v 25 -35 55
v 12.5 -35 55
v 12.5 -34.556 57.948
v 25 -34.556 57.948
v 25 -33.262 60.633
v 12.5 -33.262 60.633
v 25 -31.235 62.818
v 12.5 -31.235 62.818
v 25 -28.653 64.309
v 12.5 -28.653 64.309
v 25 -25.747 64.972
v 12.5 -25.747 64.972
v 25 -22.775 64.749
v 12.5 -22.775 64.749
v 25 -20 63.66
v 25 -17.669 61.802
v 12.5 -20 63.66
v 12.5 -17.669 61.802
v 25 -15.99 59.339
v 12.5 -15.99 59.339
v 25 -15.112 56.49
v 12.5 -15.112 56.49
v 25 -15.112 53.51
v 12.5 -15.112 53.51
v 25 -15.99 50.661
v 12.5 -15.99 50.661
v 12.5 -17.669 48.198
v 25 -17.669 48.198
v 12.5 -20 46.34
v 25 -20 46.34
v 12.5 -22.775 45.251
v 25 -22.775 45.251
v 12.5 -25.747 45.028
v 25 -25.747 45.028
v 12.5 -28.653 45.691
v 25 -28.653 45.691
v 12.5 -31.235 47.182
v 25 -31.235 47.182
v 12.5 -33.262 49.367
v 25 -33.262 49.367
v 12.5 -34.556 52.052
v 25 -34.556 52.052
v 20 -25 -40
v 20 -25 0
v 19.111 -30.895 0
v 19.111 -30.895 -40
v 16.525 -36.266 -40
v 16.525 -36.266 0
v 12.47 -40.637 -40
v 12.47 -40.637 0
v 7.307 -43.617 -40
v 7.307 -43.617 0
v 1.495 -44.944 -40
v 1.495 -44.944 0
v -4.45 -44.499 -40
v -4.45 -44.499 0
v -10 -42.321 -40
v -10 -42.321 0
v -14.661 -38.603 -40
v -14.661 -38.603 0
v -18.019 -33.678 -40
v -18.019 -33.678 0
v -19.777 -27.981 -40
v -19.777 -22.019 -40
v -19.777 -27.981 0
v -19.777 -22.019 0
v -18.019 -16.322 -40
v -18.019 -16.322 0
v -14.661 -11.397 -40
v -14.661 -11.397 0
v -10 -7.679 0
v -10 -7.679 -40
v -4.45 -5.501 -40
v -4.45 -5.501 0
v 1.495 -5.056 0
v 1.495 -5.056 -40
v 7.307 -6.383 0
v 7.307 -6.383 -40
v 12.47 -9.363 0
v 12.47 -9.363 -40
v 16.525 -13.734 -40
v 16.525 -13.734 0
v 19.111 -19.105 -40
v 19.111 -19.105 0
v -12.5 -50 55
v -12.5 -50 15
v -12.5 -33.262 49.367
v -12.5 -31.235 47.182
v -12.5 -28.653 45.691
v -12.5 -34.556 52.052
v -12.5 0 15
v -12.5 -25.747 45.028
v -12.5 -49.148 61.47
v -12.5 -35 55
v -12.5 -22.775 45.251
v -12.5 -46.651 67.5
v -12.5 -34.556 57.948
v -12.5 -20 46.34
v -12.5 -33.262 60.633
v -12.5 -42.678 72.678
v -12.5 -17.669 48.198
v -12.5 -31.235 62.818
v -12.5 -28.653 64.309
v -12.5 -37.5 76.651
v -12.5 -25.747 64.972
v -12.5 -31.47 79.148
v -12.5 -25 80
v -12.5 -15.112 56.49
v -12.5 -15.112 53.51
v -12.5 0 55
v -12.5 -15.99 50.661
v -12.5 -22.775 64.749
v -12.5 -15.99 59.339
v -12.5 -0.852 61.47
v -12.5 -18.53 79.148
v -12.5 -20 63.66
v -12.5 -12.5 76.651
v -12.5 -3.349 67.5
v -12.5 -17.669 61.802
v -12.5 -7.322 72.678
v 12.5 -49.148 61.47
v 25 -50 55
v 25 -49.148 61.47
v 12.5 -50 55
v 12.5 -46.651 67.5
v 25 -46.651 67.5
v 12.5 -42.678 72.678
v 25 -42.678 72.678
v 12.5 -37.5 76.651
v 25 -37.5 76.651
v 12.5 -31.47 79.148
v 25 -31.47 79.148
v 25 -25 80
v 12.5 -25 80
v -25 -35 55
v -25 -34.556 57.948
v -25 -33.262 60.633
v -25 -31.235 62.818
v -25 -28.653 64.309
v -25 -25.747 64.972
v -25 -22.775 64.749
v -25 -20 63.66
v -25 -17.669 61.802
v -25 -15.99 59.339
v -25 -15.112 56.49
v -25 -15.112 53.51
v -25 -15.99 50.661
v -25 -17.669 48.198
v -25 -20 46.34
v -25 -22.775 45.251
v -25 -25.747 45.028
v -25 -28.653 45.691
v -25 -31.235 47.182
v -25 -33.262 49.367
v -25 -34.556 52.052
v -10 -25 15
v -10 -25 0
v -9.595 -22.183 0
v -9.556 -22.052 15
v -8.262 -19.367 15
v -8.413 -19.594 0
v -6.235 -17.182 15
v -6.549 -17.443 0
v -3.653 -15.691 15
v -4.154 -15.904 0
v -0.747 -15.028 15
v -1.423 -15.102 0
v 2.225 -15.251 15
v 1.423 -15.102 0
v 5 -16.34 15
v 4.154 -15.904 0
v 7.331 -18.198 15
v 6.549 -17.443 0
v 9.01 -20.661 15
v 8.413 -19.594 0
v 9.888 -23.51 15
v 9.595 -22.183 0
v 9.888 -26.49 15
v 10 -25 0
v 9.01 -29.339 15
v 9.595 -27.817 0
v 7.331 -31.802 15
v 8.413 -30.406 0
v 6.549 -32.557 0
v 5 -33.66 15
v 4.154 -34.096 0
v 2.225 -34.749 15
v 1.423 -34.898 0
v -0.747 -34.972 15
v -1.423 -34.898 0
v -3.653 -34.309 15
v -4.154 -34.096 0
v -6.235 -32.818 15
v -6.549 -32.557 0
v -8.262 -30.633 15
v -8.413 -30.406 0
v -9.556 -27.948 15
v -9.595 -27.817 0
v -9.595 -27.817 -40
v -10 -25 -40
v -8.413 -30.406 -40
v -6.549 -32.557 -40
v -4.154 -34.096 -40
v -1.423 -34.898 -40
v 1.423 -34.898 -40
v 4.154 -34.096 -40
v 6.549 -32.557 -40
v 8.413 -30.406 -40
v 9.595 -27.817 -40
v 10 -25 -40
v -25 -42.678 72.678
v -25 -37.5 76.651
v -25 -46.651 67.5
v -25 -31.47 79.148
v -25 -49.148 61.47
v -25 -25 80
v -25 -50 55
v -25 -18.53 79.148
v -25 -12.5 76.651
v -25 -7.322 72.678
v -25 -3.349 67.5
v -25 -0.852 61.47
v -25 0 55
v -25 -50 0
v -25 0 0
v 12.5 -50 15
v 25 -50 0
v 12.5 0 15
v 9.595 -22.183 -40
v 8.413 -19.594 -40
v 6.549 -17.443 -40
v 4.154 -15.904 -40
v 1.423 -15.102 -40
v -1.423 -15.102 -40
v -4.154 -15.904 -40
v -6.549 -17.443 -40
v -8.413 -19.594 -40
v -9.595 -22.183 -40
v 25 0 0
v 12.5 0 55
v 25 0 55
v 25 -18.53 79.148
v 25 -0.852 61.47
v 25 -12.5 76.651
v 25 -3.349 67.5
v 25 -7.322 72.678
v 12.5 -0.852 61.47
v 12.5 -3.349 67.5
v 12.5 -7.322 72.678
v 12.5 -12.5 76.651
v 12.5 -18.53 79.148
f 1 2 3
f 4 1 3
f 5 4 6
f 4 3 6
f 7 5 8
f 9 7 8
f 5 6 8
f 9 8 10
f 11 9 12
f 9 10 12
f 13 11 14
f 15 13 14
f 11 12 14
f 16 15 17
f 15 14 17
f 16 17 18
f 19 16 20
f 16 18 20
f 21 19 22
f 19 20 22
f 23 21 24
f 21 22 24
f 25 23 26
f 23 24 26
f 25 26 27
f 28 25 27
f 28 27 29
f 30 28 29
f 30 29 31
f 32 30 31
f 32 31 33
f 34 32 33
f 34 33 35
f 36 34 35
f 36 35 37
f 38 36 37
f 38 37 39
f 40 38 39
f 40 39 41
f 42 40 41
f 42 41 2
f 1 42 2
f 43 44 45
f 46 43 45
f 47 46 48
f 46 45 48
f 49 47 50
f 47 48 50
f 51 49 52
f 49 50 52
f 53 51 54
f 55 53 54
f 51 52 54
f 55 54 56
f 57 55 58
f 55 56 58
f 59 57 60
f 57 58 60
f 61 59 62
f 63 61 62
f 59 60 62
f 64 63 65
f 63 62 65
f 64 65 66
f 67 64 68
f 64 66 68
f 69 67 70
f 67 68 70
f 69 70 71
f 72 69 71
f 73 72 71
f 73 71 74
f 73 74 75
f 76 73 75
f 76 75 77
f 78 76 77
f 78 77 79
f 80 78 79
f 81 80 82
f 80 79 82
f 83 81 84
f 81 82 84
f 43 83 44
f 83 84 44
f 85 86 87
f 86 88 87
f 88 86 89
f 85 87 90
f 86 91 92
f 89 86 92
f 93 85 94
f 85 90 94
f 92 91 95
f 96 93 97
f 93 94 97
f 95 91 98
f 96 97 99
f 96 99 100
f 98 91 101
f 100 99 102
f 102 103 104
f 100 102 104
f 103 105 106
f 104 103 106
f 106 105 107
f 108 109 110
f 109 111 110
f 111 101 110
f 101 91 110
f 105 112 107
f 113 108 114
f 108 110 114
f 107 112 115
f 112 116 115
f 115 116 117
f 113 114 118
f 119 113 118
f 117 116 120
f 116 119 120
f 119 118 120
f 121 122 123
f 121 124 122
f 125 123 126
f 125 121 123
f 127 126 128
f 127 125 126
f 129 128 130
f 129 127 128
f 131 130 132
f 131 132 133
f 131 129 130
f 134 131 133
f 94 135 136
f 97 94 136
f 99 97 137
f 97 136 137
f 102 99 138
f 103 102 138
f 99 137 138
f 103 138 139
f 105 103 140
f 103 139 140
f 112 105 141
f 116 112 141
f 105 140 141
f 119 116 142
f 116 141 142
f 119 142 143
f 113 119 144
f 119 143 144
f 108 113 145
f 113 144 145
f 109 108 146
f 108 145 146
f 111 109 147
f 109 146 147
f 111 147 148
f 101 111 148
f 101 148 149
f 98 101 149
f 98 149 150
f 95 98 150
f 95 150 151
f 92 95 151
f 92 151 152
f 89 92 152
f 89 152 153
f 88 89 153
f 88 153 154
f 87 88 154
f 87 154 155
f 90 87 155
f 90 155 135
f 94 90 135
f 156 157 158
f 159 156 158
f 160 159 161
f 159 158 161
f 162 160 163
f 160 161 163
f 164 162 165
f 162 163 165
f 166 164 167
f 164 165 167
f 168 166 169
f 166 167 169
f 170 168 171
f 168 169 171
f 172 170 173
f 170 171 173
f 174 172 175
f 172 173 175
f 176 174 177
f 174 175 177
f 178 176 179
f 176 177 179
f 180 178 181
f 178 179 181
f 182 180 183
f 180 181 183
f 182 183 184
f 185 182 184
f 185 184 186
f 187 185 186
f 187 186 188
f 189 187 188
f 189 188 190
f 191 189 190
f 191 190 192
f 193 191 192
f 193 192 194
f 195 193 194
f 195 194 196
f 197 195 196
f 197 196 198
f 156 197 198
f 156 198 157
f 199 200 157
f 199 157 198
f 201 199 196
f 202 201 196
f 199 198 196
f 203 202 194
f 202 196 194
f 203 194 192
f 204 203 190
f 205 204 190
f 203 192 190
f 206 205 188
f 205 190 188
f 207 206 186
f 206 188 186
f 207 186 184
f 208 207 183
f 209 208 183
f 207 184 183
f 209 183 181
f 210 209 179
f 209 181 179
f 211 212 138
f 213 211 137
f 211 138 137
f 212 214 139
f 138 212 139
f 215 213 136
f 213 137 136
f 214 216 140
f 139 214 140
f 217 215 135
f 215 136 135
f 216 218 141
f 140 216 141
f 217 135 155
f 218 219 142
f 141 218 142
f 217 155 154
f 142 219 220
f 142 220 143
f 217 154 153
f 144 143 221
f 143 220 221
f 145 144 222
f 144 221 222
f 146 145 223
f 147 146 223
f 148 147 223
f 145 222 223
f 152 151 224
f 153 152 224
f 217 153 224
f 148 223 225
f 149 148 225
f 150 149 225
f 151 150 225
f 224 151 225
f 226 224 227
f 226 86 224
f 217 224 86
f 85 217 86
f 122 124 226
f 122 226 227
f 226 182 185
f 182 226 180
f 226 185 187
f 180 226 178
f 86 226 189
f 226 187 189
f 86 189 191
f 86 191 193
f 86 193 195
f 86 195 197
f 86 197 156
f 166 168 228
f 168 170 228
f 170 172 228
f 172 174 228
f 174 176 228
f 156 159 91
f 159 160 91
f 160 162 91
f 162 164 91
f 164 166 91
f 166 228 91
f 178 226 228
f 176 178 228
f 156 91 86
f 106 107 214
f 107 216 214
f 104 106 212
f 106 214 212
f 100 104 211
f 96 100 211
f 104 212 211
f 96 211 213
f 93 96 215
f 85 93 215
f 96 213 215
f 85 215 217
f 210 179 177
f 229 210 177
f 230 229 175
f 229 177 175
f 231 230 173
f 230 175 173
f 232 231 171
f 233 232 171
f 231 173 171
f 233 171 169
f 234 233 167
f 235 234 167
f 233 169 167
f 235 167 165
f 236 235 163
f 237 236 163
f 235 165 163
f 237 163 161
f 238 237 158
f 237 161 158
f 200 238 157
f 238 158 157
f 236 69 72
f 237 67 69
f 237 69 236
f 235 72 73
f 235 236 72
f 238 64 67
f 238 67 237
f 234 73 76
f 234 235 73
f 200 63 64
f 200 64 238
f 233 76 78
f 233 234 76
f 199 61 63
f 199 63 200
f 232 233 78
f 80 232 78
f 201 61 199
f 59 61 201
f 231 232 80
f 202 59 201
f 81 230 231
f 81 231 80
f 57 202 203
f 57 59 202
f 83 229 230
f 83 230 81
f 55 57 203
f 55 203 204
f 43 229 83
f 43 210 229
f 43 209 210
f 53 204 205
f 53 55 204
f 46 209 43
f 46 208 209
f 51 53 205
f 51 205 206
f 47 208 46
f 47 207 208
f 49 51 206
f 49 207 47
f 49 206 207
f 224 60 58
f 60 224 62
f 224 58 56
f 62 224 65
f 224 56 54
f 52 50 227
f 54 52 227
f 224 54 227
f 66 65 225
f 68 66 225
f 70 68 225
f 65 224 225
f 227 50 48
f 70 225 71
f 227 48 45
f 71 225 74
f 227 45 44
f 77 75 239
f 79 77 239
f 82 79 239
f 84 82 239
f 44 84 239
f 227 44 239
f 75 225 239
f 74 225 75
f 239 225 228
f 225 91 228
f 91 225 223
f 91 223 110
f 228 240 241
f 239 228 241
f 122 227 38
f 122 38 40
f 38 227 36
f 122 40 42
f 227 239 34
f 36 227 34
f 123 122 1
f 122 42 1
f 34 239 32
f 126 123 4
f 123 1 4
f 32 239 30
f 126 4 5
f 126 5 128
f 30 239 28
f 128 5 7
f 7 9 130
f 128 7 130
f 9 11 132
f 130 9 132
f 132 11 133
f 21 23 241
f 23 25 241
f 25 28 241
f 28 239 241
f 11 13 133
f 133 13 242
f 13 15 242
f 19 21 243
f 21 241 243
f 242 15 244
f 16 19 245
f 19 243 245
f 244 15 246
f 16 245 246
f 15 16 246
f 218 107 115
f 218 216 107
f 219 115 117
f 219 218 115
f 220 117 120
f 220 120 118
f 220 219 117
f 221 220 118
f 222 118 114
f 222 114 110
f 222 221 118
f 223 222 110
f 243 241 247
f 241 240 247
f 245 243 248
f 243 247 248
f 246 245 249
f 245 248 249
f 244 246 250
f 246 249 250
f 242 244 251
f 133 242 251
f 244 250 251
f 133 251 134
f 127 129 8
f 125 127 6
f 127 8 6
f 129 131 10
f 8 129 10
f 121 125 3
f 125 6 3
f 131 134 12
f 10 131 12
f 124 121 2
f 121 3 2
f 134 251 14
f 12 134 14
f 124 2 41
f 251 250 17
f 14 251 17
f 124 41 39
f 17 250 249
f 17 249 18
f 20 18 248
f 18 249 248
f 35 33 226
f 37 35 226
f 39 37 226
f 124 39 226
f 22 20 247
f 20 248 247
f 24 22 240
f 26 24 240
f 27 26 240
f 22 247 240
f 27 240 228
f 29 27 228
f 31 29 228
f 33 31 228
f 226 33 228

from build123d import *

# Parameters (mm, degrees)
F1_DEPTH = 50
F2_R     = 20
F3_DEPTH = 40
F5_D     = 20
F6_R     = 24.99999
F8_D     = 20
F8_DEPTH = 40.001
F10_D    = 20


# Not quite as in the source:
# - a fillet or chamfer is up to 0.001 mm smaller than in the source, because OpenCascade refuses the exact size


with BuildPart() as f1:
    # F0 (on Front) → F1 (new body)
    with BuildSketch(Plane.XZ):
        Polygon((-25, 80), (-25, 0), (25, 0), (25, 80), (12.5, 80), (12.5, 15), (0, 15), (-12.5, 15), (-12.5, 80), align=None)
    extrude(amount=F1_DEPTH)

    # F2 (on face) → F3 (join)
    with BuildSketch(Plane(origin=(0, 0, 0), x_dir=(1, 0, 0), z_dir=(0, 0, -1))):
        with Locations((0, 25)):
            Circle(F2_R)
    extrude(amount=F3_DEPTH)

    # F5 (through all)
    with Locations(Plane.YZ.offset(25)):
        with Locations((-25, 55)):
            Hole(F5_D / 2)

    # F6 (radius 25 in the source; OpenCascade refuses exactly that, so slightly less here)
    f6_edges = [f1.edges().sort_by_distance(p)[0] for p in [
        (18.75, -50, 80),
        (18.75, 0, 80),
        (-18.75, -50, 80),
        (-18.75, 0, 80),
    ]]
    fillet(f6_edges, radius=F6_R)

    # F8 (through all, one way)
    with BuildSketch(Plane.XY):
        with Locations((0, -25)):
            Circle(F8_D / 2)
    extrude(amount=-F8_DEPTH, mode=Mode.SUBTRACT)

    # F10 (through all)
    with Locations(Plane.XY.offset(15)):
        with Locations((0, -25)):
            Hole(F10_D / 2)


solid = f1.part
